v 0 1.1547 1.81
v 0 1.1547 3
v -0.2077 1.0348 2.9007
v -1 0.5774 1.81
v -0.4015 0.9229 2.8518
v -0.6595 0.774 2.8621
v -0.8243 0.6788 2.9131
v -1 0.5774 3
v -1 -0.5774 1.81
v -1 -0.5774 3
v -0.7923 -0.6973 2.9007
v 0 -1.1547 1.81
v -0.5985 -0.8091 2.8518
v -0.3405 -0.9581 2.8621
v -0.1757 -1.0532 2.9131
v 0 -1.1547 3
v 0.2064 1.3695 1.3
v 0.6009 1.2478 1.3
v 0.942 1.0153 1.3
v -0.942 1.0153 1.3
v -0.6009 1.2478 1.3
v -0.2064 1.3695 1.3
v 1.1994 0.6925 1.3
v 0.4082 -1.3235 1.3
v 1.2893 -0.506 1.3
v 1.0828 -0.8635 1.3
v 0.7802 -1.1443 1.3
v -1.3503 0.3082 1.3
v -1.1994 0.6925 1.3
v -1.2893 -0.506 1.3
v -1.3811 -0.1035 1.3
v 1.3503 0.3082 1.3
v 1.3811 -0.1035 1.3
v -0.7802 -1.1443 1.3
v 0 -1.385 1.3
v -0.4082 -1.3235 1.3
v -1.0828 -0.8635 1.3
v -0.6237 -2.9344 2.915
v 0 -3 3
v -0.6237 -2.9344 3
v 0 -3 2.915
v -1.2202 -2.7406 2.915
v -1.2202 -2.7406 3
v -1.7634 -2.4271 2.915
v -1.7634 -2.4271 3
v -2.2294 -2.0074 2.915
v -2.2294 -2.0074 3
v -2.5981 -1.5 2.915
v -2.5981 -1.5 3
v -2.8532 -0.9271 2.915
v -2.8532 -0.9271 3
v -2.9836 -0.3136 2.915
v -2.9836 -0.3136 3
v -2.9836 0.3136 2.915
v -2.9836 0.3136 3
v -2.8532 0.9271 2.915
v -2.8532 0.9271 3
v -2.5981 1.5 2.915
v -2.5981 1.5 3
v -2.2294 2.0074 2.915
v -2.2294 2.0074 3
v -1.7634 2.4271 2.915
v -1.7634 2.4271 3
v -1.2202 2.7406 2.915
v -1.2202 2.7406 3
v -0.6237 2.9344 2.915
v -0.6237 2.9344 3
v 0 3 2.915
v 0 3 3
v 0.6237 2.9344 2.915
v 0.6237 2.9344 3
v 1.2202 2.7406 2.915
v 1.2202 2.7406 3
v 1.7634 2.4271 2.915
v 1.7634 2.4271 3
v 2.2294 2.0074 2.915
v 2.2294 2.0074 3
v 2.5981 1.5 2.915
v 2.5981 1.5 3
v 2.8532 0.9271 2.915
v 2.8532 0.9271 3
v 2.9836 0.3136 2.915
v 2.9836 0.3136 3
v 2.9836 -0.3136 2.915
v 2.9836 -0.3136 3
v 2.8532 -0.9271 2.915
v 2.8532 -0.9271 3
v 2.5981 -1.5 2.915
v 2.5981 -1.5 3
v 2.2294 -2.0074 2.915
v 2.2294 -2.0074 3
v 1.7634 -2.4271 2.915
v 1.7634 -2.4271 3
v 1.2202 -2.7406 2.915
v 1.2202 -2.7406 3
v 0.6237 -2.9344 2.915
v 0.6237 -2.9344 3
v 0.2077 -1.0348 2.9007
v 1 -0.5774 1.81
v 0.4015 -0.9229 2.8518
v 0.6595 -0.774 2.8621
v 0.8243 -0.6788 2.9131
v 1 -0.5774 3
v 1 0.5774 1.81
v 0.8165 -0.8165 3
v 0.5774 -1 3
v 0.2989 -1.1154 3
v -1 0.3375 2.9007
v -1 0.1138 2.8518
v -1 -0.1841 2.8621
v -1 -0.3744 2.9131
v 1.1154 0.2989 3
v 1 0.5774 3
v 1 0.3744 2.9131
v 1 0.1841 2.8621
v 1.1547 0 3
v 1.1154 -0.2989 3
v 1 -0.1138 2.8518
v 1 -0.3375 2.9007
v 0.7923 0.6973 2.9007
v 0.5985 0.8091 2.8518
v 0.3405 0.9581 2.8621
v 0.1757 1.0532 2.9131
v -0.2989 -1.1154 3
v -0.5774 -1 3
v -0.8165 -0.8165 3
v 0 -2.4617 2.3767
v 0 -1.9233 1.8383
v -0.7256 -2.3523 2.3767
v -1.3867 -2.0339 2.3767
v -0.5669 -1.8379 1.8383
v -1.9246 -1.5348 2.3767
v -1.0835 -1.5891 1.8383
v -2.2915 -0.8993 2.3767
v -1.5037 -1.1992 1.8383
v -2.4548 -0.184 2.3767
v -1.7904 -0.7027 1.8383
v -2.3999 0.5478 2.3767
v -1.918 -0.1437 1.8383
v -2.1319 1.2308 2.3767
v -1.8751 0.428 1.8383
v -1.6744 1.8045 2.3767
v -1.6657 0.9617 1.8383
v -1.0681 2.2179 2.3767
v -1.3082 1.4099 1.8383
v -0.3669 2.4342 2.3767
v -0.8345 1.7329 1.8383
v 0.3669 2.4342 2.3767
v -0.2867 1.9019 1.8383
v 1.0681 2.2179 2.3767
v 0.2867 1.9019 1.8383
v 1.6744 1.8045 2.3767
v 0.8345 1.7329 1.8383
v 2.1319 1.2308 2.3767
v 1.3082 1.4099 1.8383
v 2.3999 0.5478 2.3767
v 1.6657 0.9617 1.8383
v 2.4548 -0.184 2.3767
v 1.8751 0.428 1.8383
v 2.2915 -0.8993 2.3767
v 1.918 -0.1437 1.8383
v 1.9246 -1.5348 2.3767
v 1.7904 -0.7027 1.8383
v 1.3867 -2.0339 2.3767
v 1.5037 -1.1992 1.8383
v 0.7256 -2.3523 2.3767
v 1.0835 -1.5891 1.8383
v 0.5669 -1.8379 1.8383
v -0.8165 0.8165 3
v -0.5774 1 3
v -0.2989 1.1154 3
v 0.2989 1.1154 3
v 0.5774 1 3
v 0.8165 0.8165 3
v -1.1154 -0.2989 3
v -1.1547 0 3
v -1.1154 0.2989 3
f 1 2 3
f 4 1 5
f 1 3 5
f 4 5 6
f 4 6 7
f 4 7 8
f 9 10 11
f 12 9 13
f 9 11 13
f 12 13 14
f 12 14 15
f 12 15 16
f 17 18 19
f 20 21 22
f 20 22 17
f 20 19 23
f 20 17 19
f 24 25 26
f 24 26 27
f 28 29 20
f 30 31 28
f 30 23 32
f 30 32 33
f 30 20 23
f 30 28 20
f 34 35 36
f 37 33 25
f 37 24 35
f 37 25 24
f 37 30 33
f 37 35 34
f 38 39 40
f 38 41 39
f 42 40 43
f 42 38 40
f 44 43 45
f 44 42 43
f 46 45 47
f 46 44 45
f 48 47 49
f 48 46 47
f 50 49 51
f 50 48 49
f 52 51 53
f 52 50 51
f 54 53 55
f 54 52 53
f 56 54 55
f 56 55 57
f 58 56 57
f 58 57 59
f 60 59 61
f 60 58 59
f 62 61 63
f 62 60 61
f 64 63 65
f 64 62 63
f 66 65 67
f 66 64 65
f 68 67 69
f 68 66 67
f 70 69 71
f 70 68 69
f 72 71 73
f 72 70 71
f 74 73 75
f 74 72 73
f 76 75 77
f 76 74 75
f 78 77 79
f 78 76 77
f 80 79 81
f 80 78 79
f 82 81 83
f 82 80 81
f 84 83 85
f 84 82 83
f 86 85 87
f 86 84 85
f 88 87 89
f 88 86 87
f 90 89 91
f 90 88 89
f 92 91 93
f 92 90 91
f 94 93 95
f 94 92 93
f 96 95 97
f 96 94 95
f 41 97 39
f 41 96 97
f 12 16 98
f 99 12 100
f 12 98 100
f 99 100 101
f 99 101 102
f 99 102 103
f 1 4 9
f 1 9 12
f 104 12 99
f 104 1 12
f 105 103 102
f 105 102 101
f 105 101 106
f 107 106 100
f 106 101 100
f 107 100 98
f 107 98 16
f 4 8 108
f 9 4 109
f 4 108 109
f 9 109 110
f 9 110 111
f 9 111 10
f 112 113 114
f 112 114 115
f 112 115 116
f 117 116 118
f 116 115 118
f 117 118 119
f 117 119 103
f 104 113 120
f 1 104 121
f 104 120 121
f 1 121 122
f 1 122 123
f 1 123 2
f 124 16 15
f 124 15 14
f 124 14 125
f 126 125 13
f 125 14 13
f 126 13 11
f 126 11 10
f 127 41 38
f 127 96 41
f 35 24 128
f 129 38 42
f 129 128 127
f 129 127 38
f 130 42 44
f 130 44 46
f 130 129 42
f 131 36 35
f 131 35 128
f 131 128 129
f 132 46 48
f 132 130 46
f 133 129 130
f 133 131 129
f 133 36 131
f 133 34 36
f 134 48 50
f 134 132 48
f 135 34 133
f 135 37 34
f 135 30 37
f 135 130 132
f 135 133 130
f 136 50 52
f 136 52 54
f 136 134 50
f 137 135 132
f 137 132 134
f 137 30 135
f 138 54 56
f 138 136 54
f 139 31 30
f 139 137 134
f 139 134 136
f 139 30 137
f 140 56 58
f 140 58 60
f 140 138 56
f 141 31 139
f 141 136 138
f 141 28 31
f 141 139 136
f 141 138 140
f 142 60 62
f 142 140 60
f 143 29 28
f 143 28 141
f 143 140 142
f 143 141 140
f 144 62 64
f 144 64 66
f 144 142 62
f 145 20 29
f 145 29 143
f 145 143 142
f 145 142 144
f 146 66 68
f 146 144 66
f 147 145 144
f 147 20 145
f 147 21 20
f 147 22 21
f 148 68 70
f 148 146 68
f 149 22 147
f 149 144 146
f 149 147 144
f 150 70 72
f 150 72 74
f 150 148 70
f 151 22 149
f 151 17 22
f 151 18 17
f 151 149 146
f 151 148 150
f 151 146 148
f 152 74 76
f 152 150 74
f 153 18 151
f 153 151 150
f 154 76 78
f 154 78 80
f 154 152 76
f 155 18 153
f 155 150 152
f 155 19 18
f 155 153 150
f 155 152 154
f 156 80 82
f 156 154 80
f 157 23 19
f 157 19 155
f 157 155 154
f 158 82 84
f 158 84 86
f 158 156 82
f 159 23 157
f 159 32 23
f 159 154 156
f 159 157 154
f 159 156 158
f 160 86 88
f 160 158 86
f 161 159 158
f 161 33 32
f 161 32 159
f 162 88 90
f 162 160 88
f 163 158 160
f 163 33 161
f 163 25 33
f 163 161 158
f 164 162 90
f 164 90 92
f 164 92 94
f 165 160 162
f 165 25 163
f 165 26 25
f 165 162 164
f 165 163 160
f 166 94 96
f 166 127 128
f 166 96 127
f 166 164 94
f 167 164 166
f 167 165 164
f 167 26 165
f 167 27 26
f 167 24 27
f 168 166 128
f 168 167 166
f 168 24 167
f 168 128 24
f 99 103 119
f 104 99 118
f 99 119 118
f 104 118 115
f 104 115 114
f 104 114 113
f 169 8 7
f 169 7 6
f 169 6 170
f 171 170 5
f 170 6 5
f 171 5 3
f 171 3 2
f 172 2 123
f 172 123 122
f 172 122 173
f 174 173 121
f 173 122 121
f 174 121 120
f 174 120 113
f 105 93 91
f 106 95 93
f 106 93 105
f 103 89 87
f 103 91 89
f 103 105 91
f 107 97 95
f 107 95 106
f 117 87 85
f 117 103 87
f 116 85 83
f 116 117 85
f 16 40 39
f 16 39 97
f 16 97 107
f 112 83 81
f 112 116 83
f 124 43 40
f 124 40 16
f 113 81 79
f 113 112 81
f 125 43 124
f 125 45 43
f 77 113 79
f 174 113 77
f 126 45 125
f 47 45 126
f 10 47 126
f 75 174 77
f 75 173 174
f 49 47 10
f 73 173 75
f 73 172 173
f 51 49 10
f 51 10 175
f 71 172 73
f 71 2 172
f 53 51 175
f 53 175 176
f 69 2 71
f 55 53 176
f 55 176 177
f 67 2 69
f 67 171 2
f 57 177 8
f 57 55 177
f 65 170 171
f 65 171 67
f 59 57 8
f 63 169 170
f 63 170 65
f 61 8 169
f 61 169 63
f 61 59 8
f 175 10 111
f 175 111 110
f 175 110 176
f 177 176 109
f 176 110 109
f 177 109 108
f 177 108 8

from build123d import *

# Parameters (mm, degrees)
CUT_EXTRUDE2_DEPTH = 1.19


with BuildPart() as part:
    # Sketch7 → Revolve2 (revolve)
    with BuildSketch(Plane(origin=(0, 0, 0), x_dir=(0, 0, -1), z_dir=(1, 0, 0)), mode=Mode.PRIVATE) as revolve2_sk:
        Polygon((-3, 3), (-2.915, 3), (-1.3, 1.385), (-1.3, 0), (-3, 0), align=None)
    revolve(revolve2_sk.sketch.rotate(Axis((0, 0, 3), (0, 0, -1)), 180), axis=Axis((0, 0, 3), (0, 0, -1)))

    # Sketch5 → Cut-Extrude2 (cut)
    with BuildSketch(Plane.XY.offset(3)):
        Polygon((1, -0.577350269), (1, 0.577350269), (0, 1.154700538), (-1, 0.577350269), (-1, -0.577350269), (0, -1.154700538), align=None)
    extrude(amount=-CUT_EXTRUDE2_DEPTH, mode=Mode.SUBTRACT)

    # Cut-Extrude3 cone 1 section (through the dimple's axis) → Cut-Extrude3 (revolve, cut)
    with BuildSketch(Plane(origin=(0, 0, 3), x_dir=(0, -1, 0), z_dir=(1, 0, 0))):
        Polygon((0, 0), (1.154700538, 0), (0, 1.154700538), align=None)
    revolve(axis=Axis((0, 0, 3), (0, 0, -1)), mode=Mode.SUBTRACT)


solid = part.part
